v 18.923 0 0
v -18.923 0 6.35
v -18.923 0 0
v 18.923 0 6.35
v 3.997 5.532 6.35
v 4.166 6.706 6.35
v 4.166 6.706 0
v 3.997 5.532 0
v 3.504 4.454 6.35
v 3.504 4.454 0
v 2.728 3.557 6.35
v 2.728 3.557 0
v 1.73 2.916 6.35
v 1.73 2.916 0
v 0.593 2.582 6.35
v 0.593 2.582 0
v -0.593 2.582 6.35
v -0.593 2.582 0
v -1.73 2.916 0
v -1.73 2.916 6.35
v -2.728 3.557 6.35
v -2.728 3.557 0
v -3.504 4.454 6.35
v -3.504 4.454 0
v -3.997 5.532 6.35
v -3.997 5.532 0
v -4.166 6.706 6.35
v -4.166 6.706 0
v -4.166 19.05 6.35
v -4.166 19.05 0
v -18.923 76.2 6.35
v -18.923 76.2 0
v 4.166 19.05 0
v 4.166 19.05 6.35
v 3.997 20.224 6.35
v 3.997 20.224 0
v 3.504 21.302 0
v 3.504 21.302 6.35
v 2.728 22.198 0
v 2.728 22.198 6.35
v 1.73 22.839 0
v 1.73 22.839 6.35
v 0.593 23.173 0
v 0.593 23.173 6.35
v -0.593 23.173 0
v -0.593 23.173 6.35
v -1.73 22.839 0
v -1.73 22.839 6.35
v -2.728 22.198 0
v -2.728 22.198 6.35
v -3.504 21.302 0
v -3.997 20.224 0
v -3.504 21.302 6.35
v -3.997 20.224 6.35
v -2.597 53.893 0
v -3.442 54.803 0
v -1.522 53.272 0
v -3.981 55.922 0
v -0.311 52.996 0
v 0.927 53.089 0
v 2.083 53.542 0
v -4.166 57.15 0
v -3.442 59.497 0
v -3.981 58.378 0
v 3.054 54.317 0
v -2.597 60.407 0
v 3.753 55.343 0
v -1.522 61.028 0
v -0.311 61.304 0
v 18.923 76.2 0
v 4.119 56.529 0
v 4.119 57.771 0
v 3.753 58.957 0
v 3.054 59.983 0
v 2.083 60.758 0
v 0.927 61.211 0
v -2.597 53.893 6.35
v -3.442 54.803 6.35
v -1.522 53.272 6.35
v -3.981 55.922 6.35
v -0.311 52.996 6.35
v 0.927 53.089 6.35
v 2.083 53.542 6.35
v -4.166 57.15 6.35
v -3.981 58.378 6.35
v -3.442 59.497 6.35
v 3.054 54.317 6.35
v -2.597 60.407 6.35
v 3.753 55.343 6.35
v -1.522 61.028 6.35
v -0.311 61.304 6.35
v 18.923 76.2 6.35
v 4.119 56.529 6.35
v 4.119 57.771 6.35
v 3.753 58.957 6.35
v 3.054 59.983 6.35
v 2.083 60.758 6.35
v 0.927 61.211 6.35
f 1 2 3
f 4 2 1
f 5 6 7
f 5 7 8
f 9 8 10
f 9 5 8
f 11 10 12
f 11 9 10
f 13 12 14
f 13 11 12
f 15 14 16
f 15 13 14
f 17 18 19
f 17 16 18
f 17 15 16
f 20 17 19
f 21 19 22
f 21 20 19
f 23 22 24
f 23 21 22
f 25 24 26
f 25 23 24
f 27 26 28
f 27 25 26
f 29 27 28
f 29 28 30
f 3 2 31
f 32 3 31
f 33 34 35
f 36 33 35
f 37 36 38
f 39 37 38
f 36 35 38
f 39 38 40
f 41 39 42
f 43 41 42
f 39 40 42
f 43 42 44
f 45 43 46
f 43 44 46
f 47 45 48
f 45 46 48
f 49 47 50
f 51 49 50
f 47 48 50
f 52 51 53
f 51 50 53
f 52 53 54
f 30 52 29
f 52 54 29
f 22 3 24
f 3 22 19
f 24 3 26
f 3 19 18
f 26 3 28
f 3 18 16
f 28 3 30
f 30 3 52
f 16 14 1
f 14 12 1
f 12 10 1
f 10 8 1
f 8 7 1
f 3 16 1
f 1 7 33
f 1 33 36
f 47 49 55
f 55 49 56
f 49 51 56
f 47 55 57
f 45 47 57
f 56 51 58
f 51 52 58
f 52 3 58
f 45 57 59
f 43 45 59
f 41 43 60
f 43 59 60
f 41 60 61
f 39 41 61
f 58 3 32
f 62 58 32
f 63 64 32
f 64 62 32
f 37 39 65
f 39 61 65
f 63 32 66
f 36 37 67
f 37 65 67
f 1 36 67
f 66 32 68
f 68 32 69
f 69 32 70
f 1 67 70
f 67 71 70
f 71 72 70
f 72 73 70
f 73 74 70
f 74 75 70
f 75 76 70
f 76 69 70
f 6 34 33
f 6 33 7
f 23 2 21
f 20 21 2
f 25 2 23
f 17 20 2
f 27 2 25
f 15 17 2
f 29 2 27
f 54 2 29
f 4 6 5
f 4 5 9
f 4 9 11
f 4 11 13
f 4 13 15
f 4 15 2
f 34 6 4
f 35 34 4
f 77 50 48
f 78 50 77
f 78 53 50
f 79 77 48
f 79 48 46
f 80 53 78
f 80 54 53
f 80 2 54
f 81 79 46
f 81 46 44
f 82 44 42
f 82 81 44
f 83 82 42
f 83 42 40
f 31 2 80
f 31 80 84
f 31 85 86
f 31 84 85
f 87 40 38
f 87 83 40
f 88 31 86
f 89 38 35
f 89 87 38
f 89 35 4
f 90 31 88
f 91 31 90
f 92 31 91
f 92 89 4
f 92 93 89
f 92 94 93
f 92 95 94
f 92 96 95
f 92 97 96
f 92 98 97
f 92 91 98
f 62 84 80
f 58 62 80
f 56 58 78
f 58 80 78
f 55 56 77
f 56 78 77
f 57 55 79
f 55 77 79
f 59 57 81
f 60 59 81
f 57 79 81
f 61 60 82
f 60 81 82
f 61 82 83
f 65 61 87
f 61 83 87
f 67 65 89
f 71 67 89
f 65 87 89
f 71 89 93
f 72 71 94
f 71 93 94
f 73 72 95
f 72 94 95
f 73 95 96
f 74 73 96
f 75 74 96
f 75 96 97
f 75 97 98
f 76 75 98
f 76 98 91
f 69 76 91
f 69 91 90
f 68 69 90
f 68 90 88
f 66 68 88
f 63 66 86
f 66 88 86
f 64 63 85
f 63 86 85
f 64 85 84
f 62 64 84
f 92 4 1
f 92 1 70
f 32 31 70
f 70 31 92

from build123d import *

# Parameters (mm, degrees)
SKETCH1_W           = 37.846
SKETCH1_H           = 76.2
SKETCH1_R           = 4.1656
BOSS_EXTRUDE1_DEPTH = 6.35
CUT_EXTRUDE1_DEPTH  = 79.770822193


with BuildPart() as part:
    # Sketch1 → Boss-Extrude1 (new body)
    with BuildSketch(Plane.XY.offset(6.35)):
        with Locations((0, 38.1)):
            Rectangle(SKETCH1_W, SKETCH1_H)
        with Locations(Location((0, 57.15, 0), (0, 0, 180))):
            Circle(SKETCH1_R, mode=Mode.SUBTRACT)
        with Locations(Location((0, 19.05, 0), (0, 0, 180))):
            Circle(SKETCH1_R, mode=Mode.SUBTRACT)
    extrude(amount=-BOSS_EXTRUDE1_DEPTH)

    # Sketch2 → Cut-Extrude1 (cut, through all)
    with BuildSketch(Plane.XY.offset(6.35)):
        with BuildLine():
            Line((-4.1656, 6.7056), (-4.1656, 19.05))
            ThreePointArc((-4.1656, 19.05), (0, 23.2156), (4.1656, 19.05))
            Line((4.1656, 19.05), (4.1656, 6.7056))
            ThreePointArc((4.1656, 6.7056), (0, 2.54), (-4.1656, 6.7056))
        make_face()
    extrude(amount=-CUT_EXTRUDE1_DEPTH, mode=Mode.SUBTRACT)


solid = part.part
